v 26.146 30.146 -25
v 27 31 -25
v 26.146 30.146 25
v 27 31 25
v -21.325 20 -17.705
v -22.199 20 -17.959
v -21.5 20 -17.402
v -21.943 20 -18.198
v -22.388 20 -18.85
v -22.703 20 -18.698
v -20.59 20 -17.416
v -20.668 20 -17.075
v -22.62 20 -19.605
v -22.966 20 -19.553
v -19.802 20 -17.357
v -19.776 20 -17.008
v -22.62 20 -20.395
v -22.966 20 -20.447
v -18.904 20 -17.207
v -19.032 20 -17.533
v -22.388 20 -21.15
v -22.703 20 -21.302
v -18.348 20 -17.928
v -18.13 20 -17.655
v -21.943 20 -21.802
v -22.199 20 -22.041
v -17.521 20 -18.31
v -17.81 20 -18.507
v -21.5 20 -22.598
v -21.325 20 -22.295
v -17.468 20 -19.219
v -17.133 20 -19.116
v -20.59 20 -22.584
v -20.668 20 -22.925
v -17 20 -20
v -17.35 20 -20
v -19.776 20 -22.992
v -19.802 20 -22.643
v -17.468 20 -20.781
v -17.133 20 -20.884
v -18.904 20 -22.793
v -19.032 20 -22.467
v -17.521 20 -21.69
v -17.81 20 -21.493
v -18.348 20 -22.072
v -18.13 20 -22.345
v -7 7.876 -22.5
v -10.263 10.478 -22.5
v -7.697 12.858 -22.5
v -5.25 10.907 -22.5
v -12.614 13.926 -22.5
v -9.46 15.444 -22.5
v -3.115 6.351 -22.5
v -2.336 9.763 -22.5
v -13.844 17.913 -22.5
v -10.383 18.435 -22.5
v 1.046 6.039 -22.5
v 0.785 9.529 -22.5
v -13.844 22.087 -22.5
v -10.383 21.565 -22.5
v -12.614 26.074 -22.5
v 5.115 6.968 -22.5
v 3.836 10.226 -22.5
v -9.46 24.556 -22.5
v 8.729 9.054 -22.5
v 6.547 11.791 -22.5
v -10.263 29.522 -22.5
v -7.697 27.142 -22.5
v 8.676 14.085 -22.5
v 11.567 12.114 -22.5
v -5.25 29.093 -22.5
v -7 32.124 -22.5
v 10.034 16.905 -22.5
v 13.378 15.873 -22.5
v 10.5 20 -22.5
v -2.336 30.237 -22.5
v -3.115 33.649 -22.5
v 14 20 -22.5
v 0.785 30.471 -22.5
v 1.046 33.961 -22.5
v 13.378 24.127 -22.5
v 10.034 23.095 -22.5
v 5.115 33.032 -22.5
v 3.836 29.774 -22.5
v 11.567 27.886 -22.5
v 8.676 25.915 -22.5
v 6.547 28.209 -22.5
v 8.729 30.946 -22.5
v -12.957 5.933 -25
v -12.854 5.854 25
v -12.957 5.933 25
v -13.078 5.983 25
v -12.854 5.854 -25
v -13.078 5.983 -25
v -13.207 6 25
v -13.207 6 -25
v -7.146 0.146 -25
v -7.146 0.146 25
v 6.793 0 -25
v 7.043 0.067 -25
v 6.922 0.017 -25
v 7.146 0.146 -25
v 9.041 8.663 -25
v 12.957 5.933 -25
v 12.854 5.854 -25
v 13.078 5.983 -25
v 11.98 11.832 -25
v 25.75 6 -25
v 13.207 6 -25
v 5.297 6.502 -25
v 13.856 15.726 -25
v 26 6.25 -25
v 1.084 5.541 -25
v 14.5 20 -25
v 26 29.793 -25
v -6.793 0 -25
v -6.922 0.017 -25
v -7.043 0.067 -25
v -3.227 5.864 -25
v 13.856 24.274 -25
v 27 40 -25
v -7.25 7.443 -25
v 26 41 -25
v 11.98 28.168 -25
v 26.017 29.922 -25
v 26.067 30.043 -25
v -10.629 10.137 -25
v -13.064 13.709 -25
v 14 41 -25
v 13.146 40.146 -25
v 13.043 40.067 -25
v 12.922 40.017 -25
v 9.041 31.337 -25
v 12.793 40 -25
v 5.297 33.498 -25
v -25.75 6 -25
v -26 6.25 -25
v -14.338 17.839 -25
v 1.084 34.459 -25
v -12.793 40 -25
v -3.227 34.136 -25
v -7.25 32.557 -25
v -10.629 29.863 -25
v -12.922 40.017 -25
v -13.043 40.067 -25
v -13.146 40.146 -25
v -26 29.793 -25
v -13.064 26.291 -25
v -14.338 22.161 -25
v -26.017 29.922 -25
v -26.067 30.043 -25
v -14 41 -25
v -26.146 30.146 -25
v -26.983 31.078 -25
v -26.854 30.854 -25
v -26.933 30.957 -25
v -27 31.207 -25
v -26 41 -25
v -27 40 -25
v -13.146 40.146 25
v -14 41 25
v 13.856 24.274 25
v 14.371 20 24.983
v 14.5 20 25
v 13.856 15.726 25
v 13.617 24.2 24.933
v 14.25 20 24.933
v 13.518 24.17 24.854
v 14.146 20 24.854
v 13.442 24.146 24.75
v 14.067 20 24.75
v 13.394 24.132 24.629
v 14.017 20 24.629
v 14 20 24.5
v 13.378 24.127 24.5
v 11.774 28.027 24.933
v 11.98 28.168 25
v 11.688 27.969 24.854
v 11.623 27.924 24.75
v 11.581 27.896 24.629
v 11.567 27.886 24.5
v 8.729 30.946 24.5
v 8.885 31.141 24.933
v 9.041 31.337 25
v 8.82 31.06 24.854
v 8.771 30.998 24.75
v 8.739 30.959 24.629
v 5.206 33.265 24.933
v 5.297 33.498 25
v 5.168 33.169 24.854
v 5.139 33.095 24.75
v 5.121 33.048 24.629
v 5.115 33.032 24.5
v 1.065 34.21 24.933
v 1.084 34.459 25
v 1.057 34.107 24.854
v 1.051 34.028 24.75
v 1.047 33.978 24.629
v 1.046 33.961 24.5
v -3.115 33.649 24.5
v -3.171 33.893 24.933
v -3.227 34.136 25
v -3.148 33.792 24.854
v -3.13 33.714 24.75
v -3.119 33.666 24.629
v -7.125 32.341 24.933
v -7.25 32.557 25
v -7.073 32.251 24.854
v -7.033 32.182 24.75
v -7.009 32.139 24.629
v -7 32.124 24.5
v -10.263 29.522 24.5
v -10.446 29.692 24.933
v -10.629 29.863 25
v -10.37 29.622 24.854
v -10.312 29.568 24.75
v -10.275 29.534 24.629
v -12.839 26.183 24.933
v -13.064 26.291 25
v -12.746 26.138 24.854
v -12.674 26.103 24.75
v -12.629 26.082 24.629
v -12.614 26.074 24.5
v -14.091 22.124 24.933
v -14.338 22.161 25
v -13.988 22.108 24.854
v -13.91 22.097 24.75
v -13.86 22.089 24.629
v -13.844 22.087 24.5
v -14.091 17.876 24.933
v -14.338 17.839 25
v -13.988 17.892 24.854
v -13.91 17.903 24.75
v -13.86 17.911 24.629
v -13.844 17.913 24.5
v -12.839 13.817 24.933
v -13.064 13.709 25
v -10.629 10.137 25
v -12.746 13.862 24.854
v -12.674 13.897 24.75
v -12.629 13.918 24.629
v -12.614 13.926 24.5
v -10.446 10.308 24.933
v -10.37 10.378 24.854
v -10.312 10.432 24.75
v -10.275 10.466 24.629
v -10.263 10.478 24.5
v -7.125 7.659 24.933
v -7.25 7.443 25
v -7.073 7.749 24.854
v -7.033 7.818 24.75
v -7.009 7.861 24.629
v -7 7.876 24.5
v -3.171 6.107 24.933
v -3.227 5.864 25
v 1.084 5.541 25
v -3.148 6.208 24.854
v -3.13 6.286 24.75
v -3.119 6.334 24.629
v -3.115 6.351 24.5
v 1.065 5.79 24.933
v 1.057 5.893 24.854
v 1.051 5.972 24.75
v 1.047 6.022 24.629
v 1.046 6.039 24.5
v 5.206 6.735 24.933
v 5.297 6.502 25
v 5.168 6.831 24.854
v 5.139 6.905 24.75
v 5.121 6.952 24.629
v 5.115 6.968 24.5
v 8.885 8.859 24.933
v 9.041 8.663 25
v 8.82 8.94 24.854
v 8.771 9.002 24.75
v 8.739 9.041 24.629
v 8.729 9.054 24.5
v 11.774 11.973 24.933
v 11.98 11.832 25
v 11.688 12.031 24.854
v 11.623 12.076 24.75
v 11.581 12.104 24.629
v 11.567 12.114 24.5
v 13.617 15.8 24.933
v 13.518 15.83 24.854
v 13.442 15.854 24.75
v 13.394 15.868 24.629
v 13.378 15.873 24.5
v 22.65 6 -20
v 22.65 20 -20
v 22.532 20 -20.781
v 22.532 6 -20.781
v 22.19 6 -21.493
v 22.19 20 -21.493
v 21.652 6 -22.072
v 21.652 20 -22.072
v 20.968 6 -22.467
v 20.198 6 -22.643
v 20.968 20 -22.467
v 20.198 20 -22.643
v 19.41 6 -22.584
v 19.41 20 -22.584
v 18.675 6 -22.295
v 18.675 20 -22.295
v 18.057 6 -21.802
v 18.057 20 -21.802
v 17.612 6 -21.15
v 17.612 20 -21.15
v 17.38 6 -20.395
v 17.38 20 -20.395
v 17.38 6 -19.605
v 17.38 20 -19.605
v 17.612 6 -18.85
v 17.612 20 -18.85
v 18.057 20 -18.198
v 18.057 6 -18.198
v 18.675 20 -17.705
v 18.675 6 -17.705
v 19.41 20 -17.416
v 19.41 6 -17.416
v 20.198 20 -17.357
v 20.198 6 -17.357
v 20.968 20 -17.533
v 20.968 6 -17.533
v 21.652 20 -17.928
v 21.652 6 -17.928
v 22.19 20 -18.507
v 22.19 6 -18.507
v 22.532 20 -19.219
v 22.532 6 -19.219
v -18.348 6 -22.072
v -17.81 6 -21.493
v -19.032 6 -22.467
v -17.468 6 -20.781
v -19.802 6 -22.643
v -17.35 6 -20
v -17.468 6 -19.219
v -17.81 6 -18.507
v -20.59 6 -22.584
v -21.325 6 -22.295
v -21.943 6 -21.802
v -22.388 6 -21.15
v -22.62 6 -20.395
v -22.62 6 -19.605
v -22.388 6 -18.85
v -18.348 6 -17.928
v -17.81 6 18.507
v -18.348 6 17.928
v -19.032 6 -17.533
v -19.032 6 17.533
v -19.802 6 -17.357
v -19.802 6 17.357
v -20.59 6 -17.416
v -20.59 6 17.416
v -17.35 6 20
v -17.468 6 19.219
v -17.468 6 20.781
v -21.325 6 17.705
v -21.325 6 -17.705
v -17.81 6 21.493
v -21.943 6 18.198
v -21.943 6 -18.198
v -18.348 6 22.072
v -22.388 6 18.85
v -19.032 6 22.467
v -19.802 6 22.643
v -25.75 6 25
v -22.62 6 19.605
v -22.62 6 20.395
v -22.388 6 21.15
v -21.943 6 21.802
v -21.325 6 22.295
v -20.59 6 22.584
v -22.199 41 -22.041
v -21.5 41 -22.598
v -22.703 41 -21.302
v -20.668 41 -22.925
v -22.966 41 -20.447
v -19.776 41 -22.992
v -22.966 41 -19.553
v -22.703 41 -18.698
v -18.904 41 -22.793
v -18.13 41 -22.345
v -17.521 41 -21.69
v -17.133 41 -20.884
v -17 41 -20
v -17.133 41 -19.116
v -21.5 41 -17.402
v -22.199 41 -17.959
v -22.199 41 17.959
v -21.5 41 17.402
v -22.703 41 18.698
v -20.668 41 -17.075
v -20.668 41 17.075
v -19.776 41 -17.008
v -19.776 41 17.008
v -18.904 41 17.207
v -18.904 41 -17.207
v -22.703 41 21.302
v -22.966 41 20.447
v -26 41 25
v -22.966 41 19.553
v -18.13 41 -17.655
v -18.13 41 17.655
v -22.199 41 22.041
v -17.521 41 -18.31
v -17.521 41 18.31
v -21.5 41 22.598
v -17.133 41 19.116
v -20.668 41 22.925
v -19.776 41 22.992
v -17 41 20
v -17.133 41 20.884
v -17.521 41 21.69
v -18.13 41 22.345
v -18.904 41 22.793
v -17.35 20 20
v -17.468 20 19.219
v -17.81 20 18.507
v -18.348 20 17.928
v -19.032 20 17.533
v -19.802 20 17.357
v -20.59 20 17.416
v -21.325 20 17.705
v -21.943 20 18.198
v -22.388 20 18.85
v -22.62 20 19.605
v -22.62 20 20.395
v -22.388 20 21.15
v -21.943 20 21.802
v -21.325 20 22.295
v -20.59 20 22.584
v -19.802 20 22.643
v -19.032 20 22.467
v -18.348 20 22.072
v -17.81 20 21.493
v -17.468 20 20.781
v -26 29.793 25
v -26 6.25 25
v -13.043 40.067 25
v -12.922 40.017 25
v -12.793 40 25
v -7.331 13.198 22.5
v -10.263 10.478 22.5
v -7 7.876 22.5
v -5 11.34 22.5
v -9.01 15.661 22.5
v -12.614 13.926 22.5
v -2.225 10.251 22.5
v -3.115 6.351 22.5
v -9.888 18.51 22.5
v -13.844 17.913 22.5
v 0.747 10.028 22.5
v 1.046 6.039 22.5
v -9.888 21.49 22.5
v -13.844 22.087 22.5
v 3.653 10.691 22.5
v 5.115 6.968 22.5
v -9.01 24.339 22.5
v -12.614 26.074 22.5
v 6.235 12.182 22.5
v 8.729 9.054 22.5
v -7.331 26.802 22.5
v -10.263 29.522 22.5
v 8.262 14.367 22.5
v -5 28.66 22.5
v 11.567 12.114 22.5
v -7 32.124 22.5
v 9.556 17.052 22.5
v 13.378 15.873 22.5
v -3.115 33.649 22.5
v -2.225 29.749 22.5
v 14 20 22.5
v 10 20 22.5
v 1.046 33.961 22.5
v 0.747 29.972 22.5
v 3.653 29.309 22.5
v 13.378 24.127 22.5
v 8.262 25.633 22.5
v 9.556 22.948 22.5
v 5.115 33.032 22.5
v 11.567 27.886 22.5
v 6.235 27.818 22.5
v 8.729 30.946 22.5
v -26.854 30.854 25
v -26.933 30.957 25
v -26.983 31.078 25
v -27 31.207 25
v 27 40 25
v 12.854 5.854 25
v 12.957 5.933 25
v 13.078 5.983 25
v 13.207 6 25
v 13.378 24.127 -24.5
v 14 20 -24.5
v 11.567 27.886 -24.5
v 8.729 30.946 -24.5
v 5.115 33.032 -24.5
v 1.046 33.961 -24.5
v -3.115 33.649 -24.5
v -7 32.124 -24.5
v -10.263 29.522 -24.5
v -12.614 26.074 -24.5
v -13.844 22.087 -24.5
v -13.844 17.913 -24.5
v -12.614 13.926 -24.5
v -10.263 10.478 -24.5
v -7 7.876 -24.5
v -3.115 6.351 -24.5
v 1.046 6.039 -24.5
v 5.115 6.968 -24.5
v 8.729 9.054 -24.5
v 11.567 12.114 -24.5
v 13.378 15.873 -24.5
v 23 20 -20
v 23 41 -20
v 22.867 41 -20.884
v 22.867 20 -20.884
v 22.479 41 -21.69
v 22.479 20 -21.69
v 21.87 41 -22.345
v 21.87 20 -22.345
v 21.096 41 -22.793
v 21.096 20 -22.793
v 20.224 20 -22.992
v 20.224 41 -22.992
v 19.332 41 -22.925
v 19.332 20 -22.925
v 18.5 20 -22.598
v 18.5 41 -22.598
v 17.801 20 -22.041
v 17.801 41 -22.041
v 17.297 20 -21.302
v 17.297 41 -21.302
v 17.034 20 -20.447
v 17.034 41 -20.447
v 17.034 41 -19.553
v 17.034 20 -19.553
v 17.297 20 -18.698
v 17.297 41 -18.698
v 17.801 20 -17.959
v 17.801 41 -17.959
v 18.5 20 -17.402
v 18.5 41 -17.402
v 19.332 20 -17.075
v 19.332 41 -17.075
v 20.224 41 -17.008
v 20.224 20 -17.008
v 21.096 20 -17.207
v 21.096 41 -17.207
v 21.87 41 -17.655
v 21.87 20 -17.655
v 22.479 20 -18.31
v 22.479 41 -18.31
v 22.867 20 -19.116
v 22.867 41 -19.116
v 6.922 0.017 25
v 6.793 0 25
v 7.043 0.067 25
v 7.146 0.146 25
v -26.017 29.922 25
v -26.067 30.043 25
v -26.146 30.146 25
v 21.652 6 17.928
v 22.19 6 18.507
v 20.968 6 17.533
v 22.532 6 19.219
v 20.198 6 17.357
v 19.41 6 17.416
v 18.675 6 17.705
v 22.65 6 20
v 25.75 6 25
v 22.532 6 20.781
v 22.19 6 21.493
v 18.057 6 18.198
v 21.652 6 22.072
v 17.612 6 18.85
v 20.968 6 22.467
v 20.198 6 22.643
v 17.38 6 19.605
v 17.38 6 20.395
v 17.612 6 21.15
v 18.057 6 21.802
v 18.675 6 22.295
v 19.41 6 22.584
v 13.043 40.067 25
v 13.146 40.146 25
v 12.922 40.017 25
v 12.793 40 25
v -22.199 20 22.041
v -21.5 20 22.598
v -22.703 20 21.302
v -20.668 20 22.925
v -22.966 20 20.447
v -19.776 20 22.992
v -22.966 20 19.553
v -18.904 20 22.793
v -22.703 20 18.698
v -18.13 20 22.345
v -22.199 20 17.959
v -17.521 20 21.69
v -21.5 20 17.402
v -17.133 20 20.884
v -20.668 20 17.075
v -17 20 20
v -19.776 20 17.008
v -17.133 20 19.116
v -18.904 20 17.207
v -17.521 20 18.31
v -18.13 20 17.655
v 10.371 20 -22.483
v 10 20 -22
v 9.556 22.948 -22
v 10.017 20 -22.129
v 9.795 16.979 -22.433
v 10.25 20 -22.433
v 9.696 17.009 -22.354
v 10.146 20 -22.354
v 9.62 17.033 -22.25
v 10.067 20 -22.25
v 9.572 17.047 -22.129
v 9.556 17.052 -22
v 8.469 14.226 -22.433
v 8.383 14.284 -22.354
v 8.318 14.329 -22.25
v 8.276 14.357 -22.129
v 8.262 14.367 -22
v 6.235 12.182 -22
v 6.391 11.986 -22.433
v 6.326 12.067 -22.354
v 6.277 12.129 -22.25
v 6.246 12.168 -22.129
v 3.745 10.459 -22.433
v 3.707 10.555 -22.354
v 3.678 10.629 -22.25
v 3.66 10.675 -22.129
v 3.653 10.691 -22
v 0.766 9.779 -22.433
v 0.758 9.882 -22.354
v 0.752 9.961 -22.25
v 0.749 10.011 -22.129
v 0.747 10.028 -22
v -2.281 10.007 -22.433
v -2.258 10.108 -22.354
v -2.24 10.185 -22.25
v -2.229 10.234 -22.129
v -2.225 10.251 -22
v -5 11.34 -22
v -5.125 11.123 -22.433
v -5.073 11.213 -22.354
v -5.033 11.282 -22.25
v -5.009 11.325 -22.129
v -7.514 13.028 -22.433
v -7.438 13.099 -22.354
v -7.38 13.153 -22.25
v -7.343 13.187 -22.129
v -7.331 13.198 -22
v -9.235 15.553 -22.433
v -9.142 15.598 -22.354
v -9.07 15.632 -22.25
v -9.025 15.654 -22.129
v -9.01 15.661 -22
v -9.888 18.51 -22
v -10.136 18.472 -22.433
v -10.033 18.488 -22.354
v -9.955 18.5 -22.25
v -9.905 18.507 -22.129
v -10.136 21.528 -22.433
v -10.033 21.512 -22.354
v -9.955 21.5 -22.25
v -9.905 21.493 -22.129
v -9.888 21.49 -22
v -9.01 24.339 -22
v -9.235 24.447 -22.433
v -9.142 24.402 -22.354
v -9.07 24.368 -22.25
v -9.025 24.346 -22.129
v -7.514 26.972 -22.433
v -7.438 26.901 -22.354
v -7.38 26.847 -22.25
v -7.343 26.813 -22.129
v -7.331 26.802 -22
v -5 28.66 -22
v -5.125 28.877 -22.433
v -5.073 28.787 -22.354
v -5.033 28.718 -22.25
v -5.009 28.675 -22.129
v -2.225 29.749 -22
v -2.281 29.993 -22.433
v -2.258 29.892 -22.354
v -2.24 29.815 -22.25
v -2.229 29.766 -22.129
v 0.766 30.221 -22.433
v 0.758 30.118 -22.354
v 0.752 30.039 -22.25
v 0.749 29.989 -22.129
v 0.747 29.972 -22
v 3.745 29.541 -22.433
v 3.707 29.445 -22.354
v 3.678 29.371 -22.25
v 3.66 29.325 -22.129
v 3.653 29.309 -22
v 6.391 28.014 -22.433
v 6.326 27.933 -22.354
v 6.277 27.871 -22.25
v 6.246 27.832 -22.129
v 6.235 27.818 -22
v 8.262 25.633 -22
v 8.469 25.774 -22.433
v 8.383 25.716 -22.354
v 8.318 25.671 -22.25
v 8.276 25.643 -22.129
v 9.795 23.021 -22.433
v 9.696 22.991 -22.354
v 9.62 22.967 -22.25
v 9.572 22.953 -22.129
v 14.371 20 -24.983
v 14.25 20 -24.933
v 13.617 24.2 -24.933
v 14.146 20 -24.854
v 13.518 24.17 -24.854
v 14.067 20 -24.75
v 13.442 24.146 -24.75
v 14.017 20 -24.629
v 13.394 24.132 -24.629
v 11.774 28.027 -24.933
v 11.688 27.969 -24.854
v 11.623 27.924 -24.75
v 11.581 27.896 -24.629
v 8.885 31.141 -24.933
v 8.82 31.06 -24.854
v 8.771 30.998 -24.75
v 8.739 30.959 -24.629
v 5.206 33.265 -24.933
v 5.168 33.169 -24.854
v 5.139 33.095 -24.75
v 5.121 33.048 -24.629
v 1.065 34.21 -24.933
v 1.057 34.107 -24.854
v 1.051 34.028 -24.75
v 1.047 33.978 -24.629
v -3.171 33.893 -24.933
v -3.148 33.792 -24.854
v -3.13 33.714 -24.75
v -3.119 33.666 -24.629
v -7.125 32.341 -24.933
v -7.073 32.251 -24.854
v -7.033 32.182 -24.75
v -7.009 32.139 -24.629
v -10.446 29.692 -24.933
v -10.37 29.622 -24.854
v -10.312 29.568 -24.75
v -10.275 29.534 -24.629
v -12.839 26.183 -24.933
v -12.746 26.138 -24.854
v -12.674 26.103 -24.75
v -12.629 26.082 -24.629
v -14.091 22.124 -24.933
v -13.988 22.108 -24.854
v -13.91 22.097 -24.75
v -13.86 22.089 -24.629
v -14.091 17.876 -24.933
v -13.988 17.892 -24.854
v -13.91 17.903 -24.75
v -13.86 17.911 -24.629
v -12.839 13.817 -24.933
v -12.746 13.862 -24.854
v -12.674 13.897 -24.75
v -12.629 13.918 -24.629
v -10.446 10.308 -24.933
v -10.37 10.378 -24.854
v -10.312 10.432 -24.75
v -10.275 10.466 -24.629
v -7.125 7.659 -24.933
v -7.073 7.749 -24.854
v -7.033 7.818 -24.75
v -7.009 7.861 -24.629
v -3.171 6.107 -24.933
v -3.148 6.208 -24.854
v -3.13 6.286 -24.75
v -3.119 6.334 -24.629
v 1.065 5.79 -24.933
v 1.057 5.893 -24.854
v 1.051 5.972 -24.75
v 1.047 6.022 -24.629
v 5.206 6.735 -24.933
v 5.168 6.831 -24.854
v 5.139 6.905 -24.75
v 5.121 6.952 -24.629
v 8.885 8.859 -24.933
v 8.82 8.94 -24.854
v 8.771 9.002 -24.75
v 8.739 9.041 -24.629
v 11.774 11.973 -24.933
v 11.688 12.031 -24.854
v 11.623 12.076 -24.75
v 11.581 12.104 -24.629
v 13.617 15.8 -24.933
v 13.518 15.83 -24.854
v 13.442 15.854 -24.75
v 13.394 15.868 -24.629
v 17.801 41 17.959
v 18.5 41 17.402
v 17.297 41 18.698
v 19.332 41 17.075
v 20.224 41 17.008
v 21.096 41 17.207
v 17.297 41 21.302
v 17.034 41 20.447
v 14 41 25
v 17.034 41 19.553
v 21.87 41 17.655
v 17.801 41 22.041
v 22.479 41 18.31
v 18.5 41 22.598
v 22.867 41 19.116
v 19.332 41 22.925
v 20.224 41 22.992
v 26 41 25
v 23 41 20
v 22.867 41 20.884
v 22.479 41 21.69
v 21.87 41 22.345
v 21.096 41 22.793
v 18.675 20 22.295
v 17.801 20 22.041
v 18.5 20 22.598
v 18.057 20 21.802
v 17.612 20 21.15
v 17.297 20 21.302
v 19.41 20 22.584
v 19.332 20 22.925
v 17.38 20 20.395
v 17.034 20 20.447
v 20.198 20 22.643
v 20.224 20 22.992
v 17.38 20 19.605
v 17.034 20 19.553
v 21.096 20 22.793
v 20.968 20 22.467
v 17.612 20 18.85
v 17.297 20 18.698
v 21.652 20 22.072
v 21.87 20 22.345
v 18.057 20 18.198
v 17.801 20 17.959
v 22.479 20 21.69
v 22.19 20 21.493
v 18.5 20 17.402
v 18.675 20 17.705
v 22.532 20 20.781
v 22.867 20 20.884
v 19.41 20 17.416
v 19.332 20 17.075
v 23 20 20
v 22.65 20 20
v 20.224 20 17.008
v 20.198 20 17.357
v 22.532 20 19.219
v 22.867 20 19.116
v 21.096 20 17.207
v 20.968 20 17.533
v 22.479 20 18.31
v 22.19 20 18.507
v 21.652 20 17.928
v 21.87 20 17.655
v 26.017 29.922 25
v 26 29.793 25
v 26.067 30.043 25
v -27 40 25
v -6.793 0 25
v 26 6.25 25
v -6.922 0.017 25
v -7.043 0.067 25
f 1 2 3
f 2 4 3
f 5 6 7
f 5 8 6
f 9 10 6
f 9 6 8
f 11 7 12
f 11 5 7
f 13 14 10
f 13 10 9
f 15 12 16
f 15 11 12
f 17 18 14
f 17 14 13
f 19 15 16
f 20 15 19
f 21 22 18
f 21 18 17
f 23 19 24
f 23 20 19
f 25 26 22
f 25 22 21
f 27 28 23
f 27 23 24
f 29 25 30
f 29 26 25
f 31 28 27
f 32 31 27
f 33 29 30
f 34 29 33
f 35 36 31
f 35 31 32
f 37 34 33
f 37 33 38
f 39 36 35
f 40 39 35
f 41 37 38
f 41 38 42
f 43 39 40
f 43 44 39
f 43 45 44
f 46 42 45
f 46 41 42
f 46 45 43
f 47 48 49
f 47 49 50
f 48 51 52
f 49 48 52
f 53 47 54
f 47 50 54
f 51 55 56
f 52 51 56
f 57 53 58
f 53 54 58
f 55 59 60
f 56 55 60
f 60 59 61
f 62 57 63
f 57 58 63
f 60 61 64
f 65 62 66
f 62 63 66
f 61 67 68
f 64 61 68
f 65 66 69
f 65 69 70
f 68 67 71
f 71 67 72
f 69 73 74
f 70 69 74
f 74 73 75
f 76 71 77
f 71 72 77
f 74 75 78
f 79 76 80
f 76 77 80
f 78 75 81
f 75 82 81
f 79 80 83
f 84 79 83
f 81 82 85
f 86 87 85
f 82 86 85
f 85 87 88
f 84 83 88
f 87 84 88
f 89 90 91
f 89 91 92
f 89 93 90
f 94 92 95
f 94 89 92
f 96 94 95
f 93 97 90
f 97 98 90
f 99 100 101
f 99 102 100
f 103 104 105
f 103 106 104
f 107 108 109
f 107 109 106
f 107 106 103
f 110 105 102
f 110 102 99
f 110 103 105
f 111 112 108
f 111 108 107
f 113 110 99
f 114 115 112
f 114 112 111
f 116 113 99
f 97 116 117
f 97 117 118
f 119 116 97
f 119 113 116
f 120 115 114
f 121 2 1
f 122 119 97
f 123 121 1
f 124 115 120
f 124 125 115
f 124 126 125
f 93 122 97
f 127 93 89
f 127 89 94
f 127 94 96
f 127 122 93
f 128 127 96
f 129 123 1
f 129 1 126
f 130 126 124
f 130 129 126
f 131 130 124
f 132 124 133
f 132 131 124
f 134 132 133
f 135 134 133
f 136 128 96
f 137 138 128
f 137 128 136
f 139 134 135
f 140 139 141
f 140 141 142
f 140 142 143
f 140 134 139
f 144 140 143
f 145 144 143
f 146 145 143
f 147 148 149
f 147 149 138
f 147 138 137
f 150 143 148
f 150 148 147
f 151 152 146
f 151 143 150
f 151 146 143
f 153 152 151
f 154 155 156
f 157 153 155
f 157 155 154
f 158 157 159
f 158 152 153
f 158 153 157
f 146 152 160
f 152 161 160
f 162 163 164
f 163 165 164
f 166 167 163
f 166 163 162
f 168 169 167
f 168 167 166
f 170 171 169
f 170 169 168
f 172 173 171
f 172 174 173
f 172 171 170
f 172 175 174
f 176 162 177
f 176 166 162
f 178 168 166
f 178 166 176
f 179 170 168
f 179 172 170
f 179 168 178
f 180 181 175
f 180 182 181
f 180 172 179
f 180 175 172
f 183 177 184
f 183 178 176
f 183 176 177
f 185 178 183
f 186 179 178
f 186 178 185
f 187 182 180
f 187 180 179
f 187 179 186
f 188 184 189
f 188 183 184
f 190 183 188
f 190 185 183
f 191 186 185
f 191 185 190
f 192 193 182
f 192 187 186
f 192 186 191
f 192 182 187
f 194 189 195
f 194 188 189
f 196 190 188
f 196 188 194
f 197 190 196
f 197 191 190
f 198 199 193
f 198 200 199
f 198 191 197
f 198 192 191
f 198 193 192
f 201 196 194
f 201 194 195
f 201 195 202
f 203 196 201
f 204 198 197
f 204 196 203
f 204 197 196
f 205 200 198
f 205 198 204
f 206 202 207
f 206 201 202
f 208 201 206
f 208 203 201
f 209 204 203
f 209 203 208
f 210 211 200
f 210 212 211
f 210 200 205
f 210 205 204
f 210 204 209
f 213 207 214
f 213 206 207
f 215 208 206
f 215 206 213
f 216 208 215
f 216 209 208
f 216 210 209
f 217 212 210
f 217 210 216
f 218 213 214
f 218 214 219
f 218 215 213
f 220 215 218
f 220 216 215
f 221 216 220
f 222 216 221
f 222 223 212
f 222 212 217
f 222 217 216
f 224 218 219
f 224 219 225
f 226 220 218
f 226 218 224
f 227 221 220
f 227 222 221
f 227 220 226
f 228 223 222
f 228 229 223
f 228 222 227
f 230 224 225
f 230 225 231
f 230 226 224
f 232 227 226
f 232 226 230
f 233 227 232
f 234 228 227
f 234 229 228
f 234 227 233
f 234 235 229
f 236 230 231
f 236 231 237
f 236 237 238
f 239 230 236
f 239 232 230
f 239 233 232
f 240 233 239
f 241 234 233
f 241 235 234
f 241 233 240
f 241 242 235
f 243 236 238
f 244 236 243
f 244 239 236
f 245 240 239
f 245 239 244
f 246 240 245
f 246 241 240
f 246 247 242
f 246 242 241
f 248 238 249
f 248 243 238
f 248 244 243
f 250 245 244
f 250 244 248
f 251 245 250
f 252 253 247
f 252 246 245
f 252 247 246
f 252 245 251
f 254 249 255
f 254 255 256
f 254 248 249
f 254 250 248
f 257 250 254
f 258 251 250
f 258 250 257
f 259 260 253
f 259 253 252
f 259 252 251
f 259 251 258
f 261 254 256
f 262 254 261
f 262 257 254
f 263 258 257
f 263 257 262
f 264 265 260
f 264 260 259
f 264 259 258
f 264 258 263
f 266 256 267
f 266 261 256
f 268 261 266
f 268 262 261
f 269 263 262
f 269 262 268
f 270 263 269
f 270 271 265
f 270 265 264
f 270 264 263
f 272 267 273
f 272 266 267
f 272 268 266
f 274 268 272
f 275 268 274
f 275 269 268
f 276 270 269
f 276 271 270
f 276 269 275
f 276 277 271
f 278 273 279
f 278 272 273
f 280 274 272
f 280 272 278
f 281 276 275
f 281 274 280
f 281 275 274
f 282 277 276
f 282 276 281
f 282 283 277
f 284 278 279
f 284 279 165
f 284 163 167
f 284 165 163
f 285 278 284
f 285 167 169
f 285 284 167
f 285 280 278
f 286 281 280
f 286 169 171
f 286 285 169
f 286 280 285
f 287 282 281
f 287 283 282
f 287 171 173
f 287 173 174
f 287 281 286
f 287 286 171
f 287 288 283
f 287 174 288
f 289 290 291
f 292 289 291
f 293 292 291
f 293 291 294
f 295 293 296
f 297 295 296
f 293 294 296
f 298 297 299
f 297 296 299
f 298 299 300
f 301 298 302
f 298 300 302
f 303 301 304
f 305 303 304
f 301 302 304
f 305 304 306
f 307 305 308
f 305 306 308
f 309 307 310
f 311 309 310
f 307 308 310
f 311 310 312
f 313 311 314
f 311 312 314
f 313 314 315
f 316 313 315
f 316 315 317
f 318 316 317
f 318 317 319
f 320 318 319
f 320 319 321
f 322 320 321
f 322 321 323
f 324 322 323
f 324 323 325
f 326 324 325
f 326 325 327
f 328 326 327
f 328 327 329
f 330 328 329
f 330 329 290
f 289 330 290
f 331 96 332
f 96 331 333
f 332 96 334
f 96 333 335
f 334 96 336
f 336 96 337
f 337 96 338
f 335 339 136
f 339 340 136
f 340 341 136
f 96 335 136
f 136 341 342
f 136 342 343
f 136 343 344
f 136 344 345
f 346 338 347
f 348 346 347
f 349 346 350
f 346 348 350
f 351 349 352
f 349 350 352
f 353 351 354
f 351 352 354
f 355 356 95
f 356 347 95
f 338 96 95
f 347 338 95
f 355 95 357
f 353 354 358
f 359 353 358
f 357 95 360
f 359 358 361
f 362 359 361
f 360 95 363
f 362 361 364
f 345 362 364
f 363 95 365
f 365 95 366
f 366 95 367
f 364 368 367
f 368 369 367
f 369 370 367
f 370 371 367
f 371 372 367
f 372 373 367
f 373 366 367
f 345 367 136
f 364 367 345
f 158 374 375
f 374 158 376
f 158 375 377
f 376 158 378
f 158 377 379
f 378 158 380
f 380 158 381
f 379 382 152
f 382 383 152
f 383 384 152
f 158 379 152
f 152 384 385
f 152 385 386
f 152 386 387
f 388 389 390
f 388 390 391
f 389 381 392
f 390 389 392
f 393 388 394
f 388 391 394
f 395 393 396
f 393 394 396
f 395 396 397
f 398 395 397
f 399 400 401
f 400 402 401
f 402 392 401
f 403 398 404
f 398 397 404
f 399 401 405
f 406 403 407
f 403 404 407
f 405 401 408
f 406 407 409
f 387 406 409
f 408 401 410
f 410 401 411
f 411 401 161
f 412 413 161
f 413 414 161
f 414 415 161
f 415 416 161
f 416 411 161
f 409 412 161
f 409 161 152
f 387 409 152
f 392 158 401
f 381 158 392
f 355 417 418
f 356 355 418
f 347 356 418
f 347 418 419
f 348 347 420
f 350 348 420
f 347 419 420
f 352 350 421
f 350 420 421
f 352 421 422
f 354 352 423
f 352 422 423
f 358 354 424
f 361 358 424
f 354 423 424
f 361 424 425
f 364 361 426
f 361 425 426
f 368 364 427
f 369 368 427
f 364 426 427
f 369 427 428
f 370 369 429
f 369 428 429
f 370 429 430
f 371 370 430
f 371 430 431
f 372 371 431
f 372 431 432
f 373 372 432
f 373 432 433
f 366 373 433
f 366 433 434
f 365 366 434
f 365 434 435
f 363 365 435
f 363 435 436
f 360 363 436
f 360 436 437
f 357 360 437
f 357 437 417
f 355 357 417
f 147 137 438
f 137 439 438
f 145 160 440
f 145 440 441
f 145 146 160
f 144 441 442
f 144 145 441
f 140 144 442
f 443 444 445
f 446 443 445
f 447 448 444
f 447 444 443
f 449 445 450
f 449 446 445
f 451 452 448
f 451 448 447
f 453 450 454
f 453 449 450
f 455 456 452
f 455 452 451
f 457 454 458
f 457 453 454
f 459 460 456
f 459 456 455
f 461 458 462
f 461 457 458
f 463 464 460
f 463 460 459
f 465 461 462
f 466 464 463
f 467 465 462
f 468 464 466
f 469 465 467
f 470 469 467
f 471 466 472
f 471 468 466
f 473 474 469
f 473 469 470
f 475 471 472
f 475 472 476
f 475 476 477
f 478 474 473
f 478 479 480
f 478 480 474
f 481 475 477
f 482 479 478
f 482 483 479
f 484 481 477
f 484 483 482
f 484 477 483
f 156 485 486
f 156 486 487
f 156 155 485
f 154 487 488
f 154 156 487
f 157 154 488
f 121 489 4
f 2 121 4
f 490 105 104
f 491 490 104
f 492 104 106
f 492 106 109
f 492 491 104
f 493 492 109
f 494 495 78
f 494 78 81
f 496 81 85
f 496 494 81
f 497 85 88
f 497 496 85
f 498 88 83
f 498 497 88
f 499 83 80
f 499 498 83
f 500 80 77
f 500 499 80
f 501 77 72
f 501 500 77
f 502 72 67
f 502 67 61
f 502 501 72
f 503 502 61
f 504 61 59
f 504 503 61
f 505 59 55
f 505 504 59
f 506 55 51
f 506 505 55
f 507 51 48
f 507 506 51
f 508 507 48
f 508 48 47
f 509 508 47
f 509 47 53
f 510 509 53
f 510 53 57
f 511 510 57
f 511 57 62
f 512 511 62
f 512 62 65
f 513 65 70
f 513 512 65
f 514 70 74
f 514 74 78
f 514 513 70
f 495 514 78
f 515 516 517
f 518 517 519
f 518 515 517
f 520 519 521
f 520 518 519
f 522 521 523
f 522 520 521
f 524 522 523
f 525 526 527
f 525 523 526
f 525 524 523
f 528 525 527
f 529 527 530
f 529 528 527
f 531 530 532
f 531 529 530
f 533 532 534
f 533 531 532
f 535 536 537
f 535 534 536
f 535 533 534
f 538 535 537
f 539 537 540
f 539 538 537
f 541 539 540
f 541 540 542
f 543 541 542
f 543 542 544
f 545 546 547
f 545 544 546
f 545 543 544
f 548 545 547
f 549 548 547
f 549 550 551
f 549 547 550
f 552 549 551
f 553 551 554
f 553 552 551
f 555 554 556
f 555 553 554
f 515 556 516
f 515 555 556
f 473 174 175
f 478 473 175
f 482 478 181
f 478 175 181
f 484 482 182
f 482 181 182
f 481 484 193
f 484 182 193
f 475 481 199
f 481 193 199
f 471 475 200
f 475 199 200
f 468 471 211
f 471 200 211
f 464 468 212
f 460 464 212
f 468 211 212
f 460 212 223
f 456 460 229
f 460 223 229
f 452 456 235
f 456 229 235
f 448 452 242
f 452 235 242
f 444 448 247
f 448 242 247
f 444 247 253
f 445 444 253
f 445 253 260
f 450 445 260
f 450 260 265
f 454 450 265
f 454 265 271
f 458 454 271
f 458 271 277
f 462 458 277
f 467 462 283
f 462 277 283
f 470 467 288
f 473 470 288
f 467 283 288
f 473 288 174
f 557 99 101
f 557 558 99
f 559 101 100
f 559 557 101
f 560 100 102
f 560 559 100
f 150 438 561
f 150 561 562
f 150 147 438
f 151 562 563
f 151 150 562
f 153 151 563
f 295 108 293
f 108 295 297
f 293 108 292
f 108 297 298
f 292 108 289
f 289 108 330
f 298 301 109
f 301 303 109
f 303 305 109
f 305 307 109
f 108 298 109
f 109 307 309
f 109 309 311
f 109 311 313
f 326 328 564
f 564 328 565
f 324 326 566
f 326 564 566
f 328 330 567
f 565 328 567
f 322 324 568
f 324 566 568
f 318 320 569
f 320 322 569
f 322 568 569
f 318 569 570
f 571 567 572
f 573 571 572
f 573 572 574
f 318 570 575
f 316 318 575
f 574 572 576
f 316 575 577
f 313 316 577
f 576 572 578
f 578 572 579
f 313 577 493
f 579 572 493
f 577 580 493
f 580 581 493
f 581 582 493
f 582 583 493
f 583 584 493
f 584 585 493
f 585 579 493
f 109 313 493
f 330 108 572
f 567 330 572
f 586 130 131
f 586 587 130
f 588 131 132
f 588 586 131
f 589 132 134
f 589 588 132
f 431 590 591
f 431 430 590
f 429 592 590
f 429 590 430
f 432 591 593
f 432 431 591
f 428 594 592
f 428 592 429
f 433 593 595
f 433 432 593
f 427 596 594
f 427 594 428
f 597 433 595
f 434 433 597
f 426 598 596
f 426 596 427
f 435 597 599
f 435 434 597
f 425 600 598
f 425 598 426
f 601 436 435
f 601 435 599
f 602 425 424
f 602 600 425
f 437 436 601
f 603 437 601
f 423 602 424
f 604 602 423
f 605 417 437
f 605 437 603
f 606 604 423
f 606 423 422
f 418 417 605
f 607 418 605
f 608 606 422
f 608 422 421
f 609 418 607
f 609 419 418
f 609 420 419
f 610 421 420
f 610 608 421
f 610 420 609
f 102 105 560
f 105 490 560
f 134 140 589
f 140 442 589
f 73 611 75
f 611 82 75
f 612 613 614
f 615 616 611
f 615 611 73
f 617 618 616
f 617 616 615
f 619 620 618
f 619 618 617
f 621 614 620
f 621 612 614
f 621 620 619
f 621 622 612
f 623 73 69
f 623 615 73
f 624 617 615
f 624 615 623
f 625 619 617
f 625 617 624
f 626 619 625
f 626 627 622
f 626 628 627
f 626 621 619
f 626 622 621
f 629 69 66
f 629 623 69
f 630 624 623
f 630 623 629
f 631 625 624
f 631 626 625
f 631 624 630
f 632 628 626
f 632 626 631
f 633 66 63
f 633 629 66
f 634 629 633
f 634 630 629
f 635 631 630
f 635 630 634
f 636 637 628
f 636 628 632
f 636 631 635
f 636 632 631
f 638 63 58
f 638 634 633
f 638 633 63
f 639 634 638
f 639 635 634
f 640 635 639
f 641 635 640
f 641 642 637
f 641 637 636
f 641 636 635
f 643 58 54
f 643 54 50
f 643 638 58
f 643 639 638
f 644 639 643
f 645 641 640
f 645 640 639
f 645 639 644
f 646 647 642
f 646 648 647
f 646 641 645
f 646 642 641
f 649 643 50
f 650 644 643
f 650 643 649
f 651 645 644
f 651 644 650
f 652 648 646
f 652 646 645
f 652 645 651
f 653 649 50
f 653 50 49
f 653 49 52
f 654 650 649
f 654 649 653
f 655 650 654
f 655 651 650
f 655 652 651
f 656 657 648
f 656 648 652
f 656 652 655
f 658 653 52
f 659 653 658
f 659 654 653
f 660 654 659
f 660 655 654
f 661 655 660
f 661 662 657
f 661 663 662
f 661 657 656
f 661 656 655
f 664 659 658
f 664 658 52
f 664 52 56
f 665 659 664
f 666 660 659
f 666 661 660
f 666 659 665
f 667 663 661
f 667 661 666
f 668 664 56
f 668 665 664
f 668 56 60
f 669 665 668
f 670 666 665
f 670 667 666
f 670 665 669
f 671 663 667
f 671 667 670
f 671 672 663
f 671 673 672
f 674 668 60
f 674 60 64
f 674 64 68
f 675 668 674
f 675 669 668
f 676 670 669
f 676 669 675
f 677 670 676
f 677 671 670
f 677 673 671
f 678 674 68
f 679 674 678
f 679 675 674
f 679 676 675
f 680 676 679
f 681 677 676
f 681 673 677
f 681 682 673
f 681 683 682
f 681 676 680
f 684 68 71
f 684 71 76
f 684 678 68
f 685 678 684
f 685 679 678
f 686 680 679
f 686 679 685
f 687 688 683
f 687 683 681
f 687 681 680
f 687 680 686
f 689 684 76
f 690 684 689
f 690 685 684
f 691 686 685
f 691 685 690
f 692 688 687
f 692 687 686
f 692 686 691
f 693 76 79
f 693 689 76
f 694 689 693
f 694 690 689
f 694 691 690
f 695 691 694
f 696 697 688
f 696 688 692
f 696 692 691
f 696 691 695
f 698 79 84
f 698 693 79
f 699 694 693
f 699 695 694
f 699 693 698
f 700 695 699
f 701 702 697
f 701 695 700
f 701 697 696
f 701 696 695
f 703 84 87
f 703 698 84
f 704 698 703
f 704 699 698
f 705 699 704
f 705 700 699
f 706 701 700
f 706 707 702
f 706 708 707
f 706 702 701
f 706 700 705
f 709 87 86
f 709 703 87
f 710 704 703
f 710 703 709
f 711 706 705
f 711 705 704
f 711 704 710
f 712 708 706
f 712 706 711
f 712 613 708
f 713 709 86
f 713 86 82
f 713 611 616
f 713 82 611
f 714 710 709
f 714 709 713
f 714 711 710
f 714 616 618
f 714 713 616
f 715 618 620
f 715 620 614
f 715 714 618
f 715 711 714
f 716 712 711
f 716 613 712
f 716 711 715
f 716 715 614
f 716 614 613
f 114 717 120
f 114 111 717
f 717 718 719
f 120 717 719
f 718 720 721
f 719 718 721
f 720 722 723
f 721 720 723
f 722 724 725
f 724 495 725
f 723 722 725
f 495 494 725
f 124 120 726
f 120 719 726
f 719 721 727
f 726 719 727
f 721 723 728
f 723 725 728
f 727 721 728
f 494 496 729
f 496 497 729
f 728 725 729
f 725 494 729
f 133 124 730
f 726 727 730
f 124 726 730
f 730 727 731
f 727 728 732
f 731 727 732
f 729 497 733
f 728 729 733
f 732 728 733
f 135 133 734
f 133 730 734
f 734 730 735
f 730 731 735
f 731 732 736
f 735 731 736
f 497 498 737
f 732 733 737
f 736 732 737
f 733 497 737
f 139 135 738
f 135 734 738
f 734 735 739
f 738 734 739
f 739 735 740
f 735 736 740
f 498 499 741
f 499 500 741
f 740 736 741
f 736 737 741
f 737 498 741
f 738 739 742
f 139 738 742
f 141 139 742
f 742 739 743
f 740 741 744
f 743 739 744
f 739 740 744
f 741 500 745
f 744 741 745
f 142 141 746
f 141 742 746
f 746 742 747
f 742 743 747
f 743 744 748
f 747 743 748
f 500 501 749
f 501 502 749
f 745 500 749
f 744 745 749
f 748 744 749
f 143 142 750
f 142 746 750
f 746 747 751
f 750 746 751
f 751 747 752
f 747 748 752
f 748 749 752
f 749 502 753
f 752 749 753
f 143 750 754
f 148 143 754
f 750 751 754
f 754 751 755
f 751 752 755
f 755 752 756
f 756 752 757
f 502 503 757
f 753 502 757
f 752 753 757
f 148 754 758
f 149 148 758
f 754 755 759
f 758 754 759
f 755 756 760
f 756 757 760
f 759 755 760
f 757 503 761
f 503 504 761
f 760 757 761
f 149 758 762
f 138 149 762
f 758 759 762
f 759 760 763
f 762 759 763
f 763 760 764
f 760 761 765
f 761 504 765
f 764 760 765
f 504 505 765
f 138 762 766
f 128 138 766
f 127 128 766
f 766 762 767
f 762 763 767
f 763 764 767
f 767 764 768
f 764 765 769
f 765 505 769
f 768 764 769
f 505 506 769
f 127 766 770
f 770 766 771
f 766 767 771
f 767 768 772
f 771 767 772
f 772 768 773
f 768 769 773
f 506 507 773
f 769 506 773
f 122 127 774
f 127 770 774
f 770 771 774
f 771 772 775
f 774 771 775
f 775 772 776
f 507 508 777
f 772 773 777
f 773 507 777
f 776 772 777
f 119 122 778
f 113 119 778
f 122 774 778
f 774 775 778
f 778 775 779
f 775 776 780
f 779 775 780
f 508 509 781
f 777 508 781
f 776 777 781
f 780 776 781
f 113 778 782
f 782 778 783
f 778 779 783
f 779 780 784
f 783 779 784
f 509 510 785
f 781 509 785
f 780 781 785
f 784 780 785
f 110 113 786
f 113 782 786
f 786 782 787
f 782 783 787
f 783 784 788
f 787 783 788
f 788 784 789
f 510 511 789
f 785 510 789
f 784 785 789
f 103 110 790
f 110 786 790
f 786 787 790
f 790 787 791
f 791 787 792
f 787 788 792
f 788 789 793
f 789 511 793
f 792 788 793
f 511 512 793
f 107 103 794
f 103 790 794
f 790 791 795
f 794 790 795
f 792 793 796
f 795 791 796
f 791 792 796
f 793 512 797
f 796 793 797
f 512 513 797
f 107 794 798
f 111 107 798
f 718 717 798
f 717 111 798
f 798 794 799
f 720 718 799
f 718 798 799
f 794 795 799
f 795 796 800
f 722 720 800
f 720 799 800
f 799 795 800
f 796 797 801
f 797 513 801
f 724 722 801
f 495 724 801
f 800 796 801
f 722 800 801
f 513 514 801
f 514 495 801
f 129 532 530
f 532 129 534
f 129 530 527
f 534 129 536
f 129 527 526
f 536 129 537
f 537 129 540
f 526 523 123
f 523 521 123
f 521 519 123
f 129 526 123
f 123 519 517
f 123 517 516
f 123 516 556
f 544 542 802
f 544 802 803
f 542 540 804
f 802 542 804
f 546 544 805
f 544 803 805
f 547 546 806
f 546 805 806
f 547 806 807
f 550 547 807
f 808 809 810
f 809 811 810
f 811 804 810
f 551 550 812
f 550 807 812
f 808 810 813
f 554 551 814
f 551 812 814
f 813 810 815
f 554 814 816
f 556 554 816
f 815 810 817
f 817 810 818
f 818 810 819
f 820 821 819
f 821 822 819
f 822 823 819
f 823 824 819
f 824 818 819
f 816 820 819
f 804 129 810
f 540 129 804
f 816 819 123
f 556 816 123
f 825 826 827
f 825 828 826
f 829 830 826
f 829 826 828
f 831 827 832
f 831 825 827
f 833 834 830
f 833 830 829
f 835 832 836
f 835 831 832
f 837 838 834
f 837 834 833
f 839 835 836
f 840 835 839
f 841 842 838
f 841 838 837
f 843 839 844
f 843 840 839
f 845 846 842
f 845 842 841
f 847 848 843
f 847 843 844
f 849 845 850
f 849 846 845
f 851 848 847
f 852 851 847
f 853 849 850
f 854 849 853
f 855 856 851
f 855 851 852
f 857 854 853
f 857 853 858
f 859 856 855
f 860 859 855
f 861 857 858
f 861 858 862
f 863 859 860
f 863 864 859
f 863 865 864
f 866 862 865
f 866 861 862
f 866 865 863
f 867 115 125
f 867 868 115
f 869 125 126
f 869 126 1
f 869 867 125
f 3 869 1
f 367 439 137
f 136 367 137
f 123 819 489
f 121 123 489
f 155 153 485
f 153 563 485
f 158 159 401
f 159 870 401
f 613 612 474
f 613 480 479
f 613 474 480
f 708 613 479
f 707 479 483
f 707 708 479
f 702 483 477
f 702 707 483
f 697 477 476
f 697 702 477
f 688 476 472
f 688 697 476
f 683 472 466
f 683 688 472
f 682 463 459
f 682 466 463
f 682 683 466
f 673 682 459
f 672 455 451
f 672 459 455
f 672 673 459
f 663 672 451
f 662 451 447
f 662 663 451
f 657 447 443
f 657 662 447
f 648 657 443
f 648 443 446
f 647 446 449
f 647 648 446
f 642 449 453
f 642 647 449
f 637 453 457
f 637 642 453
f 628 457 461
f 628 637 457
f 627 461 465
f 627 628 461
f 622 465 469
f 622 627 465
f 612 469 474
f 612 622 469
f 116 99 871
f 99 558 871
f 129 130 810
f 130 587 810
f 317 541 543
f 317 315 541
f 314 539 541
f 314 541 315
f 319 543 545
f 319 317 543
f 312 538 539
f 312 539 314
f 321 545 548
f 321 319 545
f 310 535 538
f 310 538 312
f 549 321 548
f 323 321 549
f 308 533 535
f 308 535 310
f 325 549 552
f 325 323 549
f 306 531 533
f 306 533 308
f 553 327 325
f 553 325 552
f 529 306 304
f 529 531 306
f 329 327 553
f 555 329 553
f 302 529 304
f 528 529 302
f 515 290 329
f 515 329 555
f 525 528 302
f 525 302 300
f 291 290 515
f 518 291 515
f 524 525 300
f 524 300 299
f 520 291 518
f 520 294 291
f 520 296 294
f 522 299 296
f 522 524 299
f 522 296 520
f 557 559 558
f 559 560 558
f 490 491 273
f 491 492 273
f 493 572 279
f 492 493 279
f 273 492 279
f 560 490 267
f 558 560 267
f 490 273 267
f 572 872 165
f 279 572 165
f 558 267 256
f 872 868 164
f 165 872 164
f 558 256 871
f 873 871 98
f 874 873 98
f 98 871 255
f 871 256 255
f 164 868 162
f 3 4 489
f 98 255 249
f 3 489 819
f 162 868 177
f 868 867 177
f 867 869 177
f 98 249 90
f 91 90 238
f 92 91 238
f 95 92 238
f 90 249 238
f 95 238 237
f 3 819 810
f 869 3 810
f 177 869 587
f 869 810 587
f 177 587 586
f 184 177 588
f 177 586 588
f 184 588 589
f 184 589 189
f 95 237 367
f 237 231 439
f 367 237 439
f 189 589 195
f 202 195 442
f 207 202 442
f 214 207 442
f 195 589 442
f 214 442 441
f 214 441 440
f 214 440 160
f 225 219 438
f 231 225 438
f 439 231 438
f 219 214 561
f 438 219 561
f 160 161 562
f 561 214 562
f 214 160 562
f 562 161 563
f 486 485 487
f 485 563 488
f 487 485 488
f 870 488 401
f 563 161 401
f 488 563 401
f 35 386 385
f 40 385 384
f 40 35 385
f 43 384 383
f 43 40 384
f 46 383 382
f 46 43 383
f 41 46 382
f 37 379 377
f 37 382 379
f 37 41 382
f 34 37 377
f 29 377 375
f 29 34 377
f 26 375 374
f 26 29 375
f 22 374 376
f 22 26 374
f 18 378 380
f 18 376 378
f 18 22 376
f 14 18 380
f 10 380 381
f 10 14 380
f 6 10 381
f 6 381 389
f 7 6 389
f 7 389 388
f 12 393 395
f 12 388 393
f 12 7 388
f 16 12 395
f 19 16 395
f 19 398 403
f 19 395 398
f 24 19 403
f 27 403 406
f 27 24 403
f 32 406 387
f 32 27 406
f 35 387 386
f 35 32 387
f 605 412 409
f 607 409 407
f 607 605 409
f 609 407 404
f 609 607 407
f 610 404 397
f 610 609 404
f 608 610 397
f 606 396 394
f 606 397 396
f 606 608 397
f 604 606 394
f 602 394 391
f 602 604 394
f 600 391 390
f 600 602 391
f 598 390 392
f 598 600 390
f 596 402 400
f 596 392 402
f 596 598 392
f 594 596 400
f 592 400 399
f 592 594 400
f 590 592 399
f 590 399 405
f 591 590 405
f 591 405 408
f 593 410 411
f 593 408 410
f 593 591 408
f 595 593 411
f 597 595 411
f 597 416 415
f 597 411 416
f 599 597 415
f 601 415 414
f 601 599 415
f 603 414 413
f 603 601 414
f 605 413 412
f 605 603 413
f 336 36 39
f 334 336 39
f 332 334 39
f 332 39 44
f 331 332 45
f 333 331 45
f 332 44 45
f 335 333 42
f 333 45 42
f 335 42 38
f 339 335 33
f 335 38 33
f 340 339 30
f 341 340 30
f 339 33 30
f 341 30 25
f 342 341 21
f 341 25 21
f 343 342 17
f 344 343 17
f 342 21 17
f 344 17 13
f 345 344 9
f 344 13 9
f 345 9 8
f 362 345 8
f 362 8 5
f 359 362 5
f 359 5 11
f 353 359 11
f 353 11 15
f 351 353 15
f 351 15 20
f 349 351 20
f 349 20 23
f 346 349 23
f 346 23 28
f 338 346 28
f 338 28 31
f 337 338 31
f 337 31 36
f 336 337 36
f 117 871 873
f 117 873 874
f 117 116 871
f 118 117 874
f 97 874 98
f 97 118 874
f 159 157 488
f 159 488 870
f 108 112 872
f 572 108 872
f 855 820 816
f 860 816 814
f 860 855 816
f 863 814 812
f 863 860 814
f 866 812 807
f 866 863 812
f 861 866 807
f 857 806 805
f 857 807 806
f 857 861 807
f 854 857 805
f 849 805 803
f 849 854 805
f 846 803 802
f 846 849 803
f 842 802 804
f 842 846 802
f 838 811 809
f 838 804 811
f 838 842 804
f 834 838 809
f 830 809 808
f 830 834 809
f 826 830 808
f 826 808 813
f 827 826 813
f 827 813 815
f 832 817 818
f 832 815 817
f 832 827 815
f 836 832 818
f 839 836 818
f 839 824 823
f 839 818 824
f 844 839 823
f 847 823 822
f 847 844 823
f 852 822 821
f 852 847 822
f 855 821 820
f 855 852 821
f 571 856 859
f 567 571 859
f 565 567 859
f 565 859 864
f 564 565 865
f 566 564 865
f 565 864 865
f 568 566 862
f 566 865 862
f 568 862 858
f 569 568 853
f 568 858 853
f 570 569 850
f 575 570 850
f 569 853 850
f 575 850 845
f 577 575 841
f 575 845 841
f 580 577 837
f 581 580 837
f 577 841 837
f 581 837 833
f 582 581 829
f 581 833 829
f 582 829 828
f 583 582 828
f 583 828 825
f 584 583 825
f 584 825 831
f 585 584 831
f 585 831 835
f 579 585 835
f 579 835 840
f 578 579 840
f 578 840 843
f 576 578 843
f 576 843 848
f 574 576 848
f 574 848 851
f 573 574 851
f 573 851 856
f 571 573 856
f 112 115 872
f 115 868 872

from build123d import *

# Parameters (mm, degrees)
SKETCH2_R               = 10
BOSS_EXTRUDE1_DEPTH     = 25
SKETCH3_R               = 3
CUT_EXTRUDE1_DEPTH      = 11
CUT_EXTRUDE1_DEPTH_BACK = 20
SKETCH4_R               = 2.65
CUT_EXTRUDE2_DEPTH      = 21
SKETCH5_R               = 14
CUT_EXTRUDE3_DEPTH      = 2.5
FILLET1_R               = 0.5
CHAMFER1_SIZE           = 0.25
FILLET2_R               = 0.5


with BuildPart() as part:
    # Sketch2 → Boss-Extrude1 (new body, symmetric)
    with BuildSketch(Plane.XY):
        Polygon((7, 0), (-7, 0), (-13, 6), (-26, 6), (-26, 30), (-27, 31), (-27, 40), (-26, 41), (-14, 41), (-13, 40), (13, 40), (14, 41), (26, 41), (27, 40), (27, 31), (26, 30), (26, 6), (13, 6), align=None)
        with Locations((0, 20)):
            Circle(SKETCH2_R, mode=Mode.SUBTRACT)
    extrude(amount=BOSS_EXTRUDE1_DEPTH, both=True)

    # Sketch3 → Cut-Extrude1 (cut, two sides)
    with BuildSketch(Plane(origin=(0, 40, 0), x_dir=(1, 0, 0), z_dir=(0, 1, 0))) as cut_extrude1_sk:
        with Locations((20, -20)):
            Circle(SKETCH3_R)
        with Locations((20, 20)):
            Circle(SKETCH3_R)
        with Locations((-20, -20)):
            Circle(SKETCH3_R)
        with Locations((-20, 20)):
            Circle(SKETCH3_R)
    extrude(amount=CUT_EXTRUDE1_DEPTH, mode=Mode.SUBTRACT)
    extrude(cut_extrude1_sk.sketch, amount=-CUT_EXTRUDE1_DEPTH_BACK, mode=Mode.SUBTRACT)

    # Sketch4 → Cut-Extrude2 (cut, through all)
    with BuildSketch(Plane(origin=(0, 20, 0), x_dir=(1, 0, 0), z_dir=(0, 1, 0))):
        with Locations((-20, -20)):
            Circle(SKETCH4_R)
        with Locations((20, -20)):
            Circle(SKETCH4_R)
        with Locations((20, 20)):
            Circle(SKETCH4_R)
        with Locations((-20, 20)):
            Circle(SKETCH4_R)
    extrude(amount=-CUT_EXTRUDE2_DEPTH, mode=Mode.SUBTRACT)

    # Sketch5 → Cut-Extrude3 (cut)
    with BuildSketch(Plane.XY.offset(25)):
        with Locations((0, 20)):
            Circle(SKETCH5_R)
    cut_extrude3 = extrude(amount=-CUT_EXTRUDE3_DEPTH, mode=Mode.SUBTRACT)

    # Mirror1: Cut-Extrude3 across plane
    add(cut_extrude3.mirror(Plane.XY), mode=Mode.SUBTRACT)

    # Fillet1
    fillet1_edges = [part.edges().sort_by_distance(p)[0] for p in [
        (7, 0, 0),
        (-7, 0, 0),
        (-13, 6, 0),
        (-26, 30, 0),
        (-27, 31, 0),
        (-13, 40, 0),
        (13, 40, 0),
        (26, 30, 0),
        (13, 6, 0),
        (-10, 20, -22.5),
    ]]
    fillet(fillet1_edges, radius=FILLET1_R)

    # Chamfer1
    chamfer1_edges = [part.edges().sort_by_distance(p)[0] for p in [
        (-26, 6, 0),
        (26, 6, 0),
    ]]
    chamfer(chamfer1_edges, length=CHAMFER1_SIZE)

    # Fillet2
    fillet2_edges = [part.edges().sort_by_distance(p)[0] for p in [
        (-14, 20, 25),
        (-14, 20, -25),
    ]]
    fillet(fillet2_edges, radius=FILLET2_R)


solid = part.part
